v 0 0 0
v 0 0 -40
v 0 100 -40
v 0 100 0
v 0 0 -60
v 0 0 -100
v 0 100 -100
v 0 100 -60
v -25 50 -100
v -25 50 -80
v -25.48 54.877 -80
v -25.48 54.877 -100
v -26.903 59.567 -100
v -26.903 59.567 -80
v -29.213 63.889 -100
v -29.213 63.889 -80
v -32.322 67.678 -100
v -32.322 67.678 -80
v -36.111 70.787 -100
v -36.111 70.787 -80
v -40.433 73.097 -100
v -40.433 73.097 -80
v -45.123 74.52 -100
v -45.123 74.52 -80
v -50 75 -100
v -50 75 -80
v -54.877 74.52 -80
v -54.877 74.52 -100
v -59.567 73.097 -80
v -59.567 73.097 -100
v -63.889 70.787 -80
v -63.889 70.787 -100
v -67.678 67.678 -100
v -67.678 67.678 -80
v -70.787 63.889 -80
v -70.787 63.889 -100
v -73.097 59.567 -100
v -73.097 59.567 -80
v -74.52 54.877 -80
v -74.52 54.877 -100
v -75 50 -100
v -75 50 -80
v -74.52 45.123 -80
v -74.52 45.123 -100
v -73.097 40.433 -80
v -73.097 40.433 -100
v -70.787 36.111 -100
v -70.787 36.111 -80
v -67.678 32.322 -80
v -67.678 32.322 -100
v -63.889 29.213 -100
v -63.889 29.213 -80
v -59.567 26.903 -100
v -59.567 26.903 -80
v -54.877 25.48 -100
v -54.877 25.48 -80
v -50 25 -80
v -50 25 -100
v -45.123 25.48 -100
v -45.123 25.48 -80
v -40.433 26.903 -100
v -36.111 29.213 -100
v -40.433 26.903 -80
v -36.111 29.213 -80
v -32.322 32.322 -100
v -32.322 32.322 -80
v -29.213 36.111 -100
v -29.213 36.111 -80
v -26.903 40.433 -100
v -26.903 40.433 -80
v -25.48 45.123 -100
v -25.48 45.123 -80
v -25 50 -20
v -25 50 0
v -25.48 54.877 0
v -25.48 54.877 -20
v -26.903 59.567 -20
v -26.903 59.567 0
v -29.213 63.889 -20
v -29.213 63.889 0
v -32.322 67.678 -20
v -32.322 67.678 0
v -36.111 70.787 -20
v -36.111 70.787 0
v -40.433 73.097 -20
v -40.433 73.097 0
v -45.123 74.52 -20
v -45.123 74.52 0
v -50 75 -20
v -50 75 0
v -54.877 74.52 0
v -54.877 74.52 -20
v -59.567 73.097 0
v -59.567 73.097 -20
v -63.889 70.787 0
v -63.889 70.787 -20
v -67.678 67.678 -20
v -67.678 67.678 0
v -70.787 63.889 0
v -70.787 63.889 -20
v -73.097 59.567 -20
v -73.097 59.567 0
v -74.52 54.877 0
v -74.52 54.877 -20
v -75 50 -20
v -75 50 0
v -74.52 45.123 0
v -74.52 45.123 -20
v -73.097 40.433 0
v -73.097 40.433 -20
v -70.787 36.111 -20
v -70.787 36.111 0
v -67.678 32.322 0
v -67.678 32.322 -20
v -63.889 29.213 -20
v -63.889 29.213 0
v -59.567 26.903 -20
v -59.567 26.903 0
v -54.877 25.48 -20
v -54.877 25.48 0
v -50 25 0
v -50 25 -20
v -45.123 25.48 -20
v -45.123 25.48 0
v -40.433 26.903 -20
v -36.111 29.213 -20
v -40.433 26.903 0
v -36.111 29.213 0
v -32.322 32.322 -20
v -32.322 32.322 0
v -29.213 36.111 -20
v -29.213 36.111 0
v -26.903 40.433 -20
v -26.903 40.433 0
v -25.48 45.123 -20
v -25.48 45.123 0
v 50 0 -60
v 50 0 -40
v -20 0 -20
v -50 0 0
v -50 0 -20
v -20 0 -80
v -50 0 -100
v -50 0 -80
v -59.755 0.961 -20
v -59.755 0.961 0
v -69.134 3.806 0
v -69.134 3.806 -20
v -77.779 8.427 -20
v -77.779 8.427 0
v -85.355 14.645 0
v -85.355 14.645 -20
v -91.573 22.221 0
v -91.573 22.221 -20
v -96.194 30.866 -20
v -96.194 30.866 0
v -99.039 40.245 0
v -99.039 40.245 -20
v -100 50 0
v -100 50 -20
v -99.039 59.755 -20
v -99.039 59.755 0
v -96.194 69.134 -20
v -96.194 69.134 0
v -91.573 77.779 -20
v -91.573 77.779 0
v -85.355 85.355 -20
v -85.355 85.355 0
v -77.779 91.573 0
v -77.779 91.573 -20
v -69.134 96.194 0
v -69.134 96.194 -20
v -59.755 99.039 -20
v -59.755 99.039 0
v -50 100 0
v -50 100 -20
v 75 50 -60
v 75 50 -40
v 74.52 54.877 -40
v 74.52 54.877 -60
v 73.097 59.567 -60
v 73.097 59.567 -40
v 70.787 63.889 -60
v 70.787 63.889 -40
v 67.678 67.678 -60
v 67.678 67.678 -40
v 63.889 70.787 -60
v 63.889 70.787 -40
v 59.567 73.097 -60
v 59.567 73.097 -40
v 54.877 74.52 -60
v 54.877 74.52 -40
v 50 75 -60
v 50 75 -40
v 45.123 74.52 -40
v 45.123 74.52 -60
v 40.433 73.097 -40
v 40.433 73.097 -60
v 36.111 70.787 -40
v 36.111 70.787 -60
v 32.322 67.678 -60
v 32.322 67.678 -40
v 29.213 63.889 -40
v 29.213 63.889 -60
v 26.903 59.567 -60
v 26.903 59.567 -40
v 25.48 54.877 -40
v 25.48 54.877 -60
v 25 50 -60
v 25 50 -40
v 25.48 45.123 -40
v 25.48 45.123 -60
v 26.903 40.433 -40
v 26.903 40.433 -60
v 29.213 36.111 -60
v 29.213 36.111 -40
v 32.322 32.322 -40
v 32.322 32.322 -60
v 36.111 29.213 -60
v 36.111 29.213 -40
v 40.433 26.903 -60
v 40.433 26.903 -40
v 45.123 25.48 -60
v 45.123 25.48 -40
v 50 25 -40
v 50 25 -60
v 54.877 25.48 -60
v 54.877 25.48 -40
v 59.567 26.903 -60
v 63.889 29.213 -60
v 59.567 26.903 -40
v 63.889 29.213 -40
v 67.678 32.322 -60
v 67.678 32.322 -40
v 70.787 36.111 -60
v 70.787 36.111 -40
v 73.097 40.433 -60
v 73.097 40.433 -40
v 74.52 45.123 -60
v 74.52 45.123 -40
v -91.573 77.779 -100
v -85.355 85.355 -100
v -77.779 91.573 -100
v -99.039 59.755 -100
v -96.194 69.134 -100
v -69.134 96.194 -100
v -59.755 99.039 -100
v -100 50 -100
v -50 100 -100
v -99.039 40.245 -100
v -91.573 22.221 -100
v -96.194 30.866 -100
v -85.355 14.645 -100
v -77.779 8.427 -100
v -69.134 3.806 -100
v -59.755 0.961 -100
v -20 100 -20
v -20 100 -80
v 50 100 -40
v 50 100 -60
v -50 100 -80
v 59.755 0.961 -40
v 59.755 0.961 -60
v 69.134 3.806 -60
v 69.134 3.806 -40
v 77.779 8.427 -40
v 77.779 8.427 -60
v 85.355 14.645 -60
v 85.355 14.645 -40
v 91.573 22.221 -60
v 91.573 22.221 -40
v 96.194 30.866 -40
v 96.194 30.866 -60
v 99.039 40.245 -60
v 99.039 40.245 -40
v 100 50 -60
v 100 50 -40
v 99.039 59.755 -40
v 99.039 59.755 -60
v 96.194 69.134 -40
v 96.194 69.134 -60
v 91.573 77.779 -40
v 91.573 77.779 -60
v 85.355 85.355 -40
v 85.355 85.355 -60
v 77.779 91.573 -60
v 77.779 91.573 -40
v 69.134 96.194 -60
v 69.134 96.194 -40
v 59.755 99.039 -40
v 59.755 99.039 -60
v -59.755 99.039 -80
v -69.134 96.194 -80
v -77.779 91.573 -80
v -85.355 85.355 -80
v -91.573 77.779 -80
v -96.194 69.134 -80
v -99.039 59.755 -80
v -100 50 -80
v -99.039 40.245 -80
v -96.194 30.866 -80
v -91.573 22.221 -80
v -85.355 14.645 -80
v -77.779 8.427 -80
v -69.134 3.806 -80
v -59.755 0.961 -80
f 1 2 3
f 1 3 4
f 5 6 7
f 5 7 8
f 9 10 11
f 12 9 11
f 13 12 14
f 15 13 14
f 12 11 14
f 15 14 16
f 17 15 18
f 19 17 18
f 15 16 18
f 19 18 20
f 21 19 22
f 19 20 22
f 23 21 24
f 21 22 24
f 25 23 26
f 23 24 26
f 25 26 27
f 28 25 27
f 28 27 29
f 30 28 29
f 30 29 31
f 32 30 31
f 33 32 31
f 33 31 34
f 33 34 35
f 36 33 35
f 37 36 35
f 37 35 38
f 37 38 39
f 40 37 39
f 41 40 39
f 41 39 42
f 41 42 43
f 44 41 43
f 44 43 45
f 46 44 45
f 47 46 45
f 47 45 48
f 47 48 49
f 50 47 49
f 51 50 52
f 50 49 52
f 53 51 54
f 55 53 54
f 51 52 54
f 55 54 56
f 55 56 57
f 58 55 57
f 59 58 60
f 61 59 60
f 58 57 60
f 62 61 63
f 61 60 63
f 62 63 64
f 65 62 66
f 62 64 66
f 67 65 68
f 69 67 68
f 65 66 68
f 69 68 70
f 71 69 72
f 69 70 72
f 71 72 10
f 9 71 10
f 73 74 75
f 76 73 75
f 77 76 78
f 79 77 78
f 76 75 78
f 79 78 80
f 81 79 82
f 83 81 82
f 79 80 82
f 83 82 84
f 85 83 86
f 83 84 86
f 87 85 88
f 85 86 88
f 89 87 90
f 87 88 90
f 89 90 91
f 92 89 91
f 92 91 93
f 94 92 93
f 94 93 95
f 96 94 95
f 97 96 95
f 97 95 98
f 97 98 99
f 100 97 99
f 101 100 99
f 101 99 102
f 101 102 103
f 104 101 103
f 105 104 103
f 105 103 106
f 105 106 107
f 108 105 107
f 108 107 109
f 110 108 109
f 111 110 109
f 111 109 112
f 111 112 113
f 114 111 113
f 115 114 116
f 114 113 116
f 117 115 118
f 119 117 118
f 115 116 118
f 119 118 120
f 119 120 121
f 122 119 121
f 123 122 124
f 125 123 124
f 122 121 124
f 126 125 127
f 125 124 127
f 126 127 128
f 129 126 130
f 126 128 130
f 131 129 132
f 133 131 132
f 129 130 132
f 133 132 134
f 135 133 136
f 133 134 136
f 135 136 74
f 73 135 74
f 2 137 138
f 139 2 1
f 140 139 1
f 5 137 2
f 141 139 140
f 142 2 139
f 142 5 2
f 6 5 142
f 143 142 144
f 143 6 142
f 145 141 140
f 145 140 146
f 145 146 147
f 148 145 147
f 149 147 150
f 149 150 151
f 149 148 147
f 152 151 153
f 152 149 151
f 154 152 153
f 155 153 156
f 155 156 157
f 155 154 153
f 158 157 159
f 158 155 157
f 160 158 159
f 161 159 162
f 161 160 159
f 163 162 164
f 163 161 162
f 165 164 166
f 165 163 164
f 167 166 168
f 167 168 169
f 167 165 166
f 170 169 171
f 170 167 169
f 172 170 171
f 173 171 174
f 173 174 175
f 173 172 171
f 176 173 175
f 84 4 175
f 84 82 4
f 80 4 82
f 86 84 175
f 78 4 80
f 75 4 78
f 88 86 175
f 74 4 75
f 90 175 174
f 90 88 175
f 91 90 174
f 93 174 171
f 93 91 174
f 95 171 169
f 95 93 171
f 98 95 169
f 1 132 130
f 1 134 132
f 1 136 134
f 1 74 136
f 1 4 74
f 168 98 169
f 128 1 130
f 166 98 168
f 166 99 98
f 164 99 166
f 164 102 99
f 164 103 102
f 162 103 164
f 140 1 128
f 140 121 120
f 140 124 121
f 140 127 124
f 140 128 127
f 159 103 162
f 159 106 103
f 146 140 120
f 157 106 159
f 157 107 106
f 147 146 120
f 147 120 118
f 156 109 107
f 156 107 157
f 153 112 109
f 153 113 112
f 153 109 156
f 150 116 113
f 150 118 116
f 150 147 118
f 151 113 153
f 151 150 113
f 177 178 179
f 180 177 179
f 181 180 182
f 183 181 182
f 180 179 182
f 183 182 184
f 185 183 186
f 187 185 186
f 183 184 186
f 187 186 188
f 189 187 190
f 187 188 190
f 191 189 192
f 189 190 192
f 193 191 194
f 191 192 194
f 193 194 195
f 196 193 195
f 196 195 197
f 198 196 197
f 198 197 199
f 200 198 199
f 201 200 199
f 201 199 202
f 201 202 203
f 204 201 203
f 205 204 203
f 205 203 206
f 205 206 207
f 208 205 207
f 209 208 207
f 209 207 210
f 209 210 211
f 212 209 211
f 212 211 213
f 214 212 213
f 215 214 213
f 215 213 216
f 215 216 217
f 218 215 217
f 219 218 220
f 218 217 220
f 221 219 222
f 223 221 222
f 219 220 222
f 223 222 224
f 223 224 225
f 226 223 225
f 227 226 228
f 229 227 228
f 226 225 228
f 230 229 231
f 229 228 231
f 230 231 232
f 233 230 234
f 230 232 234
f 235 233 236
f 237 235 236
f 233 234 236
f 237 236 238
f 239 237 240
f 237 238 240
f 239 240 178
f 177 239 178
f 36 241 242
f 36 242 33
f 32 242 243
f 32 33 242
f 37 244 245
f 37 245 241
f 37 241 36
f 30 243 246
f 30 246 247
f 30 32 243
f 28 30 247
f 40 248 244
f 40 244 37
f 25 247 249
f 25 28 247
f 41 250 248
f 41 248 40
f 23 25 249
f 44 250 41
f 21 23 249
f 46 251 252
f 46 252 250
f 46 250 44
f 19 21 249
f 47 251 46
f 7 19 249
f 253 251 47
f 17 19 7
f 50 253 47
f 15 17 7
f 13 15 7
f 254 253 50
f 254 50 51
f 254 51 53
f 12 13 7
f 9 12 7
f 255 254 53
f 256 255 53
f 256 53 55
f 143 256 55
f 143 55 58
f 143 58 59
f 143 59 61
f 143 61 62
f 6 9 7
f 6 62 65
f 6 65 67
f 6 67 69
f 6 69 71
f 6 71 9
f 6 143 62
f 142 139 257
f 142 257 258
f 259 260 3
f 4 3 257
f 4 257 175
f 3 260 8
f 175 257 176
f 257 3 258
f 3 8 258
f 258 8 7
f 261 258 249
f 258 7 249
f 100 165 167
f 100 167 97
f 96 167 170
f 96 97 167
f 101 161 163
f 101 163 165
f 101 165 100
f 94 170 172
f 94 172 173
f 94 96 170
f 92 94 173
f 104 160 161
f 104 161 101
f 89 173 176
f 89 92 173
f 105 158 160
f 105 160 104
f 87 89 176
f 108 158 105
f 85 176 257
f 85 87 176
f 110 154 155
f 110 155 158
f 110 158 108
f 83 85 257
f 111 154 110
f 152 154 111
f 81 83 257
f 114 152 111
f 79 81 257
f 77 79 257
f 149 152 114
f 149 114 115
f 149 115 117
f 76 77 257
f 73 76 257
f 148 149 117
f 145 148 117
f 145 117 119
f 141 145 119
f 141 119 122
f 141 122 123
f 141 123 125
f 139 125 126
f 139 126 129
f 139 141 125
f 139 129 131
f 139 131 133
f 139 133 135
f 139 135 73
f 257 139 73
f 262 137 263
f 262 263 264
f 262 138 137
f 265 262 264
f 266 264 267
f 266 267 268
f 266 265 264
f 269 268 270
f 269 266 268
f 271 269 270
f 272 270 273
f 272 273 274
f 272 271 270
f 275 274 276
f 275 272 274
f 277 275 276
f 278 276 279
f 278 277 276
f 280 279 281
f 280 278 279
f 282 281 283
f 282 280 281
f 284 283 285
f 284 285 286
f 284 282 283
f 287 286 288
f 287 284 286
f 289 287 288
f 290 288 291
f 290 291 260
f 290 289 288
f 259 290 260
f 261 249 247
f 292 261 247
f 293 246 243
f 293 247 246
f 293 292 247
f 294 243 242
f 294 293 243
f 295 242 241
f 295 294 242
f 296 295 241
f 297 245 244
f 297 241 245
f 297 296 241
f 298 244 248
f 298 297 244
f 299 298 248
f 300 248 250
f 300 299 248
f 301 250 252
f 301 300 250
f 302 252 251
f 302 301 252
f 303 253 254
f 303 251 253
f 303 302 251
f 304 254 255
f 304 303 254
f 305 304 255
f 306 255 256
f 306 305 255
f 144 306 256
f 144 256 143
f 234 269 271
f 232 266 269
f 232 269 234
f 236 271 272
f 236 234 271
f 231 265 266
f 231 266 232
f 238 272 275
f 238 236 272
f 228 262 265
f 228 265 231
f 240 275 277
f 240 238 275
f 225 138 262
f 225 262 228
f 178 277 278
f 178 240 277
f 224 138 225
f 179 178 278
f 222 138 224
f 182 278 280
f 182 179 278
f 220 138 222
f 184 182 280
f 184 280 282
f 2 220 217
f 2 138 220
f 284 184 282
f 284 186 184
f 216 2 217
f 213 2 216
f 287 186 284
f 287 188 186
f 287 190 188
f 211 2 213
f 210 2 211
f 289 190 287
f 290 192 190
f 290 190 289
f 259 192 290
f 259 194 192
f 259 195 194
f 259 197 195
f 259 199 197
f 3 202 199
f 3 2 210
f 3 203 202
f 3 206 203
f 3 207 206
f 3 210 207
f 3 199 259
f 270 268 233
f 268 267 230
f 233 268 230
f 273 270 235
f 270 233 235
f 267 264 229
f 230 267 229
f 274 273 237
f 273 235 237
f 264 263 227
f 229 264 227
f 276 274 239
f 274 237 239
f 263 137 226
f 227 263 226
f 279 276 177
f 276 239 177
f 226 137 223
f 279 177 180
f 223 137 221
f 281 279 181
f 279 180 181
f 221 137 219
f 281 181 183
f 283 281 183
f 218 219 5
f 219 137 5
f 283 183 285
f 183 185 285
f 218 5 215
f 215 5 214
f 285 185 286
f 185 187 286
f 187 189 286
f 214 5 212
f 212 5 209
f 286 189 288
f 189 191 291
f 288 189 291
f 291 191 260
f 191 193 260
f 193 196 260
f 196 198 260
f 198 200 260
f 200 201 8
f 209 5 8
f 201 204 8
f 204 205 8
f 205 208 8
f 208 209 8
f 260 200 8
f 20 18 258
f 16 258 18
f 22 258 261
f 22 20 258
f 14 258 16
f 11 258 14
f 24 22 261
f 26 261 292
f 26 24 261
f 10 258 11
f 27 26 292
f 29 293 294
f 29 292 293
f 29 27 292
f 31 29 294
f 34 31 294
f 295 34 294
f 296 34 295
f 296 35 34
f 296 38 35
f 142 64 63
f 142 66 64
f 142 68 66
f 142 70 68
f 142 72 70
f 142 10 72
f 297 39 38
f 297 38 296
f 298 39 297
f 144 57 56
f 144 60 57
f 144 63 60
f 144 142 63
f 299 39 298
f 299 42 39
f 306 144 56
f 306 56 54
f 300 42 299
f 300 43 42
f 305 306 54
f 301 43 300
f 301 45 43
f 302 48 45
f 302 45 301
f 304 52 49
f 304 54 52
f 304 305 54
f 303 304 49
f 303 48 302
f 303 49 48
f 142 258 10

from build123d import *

# Parameters (mm, degrees)
SALIENTE_EXTRUIR1_DEPTH = 100
REDONDEO1_RADIUS        = 50
REDONDEO1_LENGTH        = 20
REDONDEO2_RADIUS        = 50
REDONDEO2_LENGTH        = 20
CROQUIS3_R              = 25
CORTAR_EXTRUIR1_DEPTH   = 174.205080757
CROQUIS10_W             = 20
CROQUIS10_H             = 100
SALIENTE_EXTRUIR3_DEPTH = 100
REDONDEO3_RADIUS        = 50
REDONDEO3_LENGTH        = 20
CROQUIS11_R             = 25
CORTAR_EXTRUIR5_DEPTH   = 154.622914957


with BuildPart() as part:
    # Croquis1 → Saliente-Extruir1 (new body)
    with BuildSketch(Plane(origin=(0, 0, 0), x_dir=(1, 0, 0), z_dir=(0, 1, 0))):
        Polygon((-100, 100), (0, 100), (0, 0), (-100, 0), (-100, 20), (-20, 20), (-20, 80), (-100, 80), align=None)
    extrude(amount=SALIENTE_EXTRUIR1_DEPTH)

    # Redondeo1: full round fillet: the end face becomes a half cylinder, R = half its width
    redondeo1_face = Plane((-100, 50, -90), x_dir=(0, 0, 1), z_dir=(-1, 0, 0))  # on the end face: x along it, z out of the body
    redondeo1_slab = redondeo1_face.offset(-REDONDEO1_RADIUS / 2) * Box(REDONDEO1_LENGTH, 2 * REDONDEO1_RADIUS, REDONDEO1_RADIUS, mode=Mode.PRIVATE)  # the body's end, R deep
    redondeo1_round = Plane((-50, 50, -90), x_dir=(-1, 0, 0), z_dir=(0, 0, 1)) * Cylinder(REDONDEO1_RADIUS, REDONDEO1_LENGTH, mode=Mode.PRIVATE)  # its axis R under the face
    add(redondeo1_slab - redondeo1_round, mode=Mode.SUBTRACT)

    # Redondeo2: full round fillet: the end face becomes a half cylinder, R = half its width
    redondeo2_face = Plane((-100, 50, -10), x_dir=(0, 0, -1), z_dir=(-1, 0, 0))  # on the end face: x along it, z out of the body
    redondeo2_slab = redondeo2_face.offset(-REDONDEO2_RADIUS / 2) * Box(REDONDEO2_LENGTH, 2 * REDONDEO2_RADIUS, REDONDEO2_RADIUS, mode=Mode.PRIVATE)  # the body's end, R deep
    redondeo2_round = Plane((-50, 50, -10), x_dir=(-1, 0, 0), z_dir=(0, 0, -1)) * Cylinder(REDONDEO2_RADIUS, REDONDEO2_LENGTH, mode=Mode.PRIVATE)  # its axis R under the face
    add(redondeo2_slab - redondeo2_round, mode=Mode.SUBTRACT)

    # Croquis3 → Cortar-Extruir1 (cut, through all)
    with BuildSketch(Plane.XY):
        with Locations((-50, 50)):
            Circle(CROQUIS3_R)
    extrude(amount=-CORTAR_EXTRUIR1_DEPTH, mode=Mode.SUBTRACT)

    # Croquis10 → Saliente-Extruir3 (add)
    with BuildSketch(Plane(origin=(0, 0, 0), x_dir=(0, 0, -1), z_dir=(1, 0, 0))):
        with Locations((50, 50)):
            Rectangle(CROQUIS10_W, CROQUIS10_H)
    extrude(amount=SALIENTE_EXTRUIR3_DEPTH)

    # Redondeo3: full round fillet: the end face becomes a half cylinder, R = half its width
    redondeo3_face = Plane((100, 50, -50), x_dir=(0, 0, 1), z_dir=(1, 0, 0))  # on the end face: x along it, z out of the body
    redondeo3_slab = redondeo3_face.offset(-REDONDEO3_RADIUS / 2) * Box(REDONDEO3_LENGTH, 2 * REDONDEO3_RADIUS, REDONDEO3_RADIUS, mode=Mode.PRIVATE)  # the body's end, R deep
    redondeo3_round = Plane((50, 50, -50), x_dir=(1, 0, 0), z_dir=(0, 0, 1)) * Cylinder(REDONDEO3_RADIUS, REDONDEO3_LENGTH, mode=Mode.PRIVATE)  # its axis R under the face
    add(redondeo3_slab - redondeo3_round, mode=Mode.SUBTRACT)

    # Croquis11 → Cortar-Extruir5 (cut, through all)
    with BuildSketch(Plane.XY.offset(-40)):
        with Locations((50, 50)):
            Circle(CROQUIS11_R)
    extrude(amount=-CORTAR_EXTRUIR5_DEPTH, mode=Mode.SUBTRACT)


solid = part.part
